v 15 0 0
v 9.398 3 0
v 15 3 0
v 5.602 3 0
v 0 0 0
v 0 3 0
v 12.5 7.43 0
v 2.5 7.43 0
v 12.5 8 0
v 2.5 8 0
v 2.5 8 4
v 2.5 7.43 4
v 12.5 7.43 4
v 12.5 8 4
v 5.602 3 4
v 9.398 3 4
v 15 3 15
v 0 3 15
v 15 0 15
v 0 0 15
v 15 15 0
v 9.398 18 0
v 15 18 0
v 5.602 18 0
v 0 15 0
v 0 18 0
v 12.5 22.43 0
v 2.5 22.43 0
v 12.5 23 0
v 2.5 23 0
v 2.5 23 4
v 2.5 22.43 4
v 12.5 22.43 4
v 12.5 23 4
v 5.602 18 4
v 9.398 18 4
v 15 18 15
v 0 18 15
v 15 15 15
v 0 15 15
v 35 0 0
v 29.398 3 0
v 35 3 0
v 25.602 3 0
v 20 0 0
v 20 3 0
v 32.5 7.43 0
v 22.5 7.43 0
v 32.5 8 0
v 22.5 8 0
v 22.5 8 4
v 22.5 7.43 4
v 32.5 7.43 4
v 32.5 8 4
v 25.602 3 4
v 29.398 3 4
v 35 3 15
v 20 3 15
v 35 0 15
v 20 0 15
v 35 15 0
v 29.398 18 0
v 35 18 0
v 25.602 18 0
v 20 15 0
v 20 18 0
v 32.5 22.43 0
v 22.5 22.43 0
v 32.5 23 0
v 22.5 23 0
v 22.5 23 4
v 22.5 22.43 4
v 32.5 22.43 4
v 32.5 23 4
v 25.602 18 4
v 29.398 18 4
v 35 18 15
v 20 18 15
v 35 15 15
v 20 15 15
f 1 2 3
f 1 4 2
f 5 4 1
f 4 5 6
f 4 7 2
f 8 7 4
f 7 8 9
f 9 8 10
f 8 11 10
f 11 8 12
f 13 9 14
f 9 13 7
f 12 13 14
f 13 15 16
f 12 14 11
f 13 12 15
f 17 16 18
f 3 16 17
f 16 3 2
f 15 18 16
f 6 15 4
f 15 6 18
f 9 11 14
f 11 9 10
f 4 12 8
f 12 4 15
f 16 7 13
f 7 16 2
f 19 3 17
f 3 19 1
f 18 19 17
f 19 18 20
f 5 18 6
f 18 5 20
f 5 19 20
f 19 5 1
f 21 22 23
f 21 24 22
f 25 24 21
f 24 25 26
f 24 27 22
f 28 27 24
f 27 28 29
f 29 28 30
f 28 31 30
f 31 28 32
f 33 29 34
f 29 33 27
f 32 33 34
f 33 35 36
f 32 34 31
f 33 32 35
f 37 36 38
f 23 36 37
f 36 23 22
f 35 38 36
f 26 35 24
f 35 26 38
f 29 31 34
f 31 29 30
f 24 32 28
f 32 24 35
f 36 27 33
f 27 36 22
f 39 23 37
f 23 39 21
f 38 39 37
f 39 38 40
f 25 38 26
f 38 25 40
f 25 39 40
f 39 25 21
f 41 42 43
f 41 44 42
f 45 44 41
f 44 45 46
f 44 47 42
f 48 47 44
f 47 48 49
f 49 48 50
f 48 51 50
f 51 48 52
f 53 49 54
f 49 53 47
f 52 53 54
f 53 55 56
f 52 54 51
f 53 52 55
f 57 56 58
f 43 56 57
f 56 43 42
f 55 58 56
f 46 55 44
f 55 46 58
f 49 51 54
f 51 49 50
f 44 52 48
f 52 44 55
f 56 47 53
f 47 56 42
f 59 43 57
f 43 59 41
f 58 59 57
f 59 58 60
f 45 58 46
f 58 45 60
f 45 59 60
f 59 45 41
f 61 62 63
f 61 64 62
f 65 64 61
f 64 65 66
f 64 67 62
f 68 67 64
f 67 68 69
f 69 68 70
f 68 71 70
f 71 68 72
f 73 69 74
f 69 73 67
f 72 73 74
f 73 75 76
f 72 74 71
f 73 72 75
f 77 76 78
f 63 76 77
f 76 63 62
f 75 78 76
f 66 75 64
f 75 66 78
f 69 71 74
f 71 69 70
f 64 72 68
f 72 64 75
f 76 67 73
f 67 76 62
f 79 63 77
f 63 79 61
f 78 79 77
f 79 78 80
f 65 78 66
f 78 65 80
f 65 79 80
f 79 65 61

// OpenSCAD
// file: shapes.scad
/*
 *  OpenSCAD Shapes Library (www.openscad.at)
 *  Copyright (C) 2009  Catarina Mota <clifford@clifford.at>
 *
 *  This program is free software; you can redistribute it and/or modify
 *  it under the terms of the GNU General Public License as published by
 *  the Free Software Foundation; either version 2 of the License, or
 *  (at your option) any later version.
 *
 *  This program is distributed in the hope that it will be useful,
 *  but WITHOUT ANY WARRANTY; without even the implied warranty of
 *  MERCHANTABILITY or FITNESS FOR A PARTICULAR PURPOSE.  See the
 *  GNU General Public License for more details.
 *
 *  You should have received a copy of the GNU General Public License
 *  along with this program; if not, write to the Free Software
 *  Foundation, Inc., 59 Temple Place, Suite 330, Boston, MA  02111-1307  USA
 *
*/


//box(width, height, depth);
//roundedBox(width, height, depth, factor);
//cone(height, radius);
//oval(width, height, depth);
//tube(height, radius, wall);
//ovalTube(width, height, depth, wall);
//hexagon(height, depth);
//octagon(height, depth);
//dodecagon(height, depth);
//hexagram(height, depth);
//rightTriangle(adjacent, opposite, depth);
//equiTriangle(side, depth);
//12ptStar(height, depth);

//----------------------

//roundedBox(120, 60, 3, 8);

//----------------------

module box(w,h,d) {
	scale ([w,h,d]) cube(1, true);
}

module roundedBox(w,h,d,f){
	difference(){
		box(w,h,d);
		translate([-w/2,h/2,0]) cube(w/(f/2),true);
		translate([w/2,h/2,0]) cube(w/(f/2),true);
		translate([-w/2,-h/2,0]) cube(w/(f/2),true);
		translate([w/2,-h/2,0]) cube(w/(f/2),true);
	}
	translate([-w/2+w/f,h/2-w/f,-d/2]) cylinder(d,w/f, w/f);
	translate([w/2-w/f,h/2-w/f,-d/2]) cylinder(d,w/f, w/f);
	translate([-w/2+w/f,-h/2+w/f,-d/2]) cylinder(d,w/f, w/f);
	translate([w/2-w/f,-h/2+w/f,-d/2]) cylinder(d,w/f, w/f);
}

module cone(height, radius) {
		cylinder(height, radius, 0);
}

module oval(w,h,d) {
	scale ([w/100, h/100, 1]) cylinder(d, 50, 50);
}

module tube(height, radius, wall) {
	difference(){
		cylinder(height, radius, radius);
		cylinder(height, radius-wall, radius-wall);
	}
}

module ovalTube(w,h,d,wall) {
	difference(){
		scale ([w/100, h/100, 1]) cylinder(d, 50, 50);
		scale ([w/100, h/100, 1]) cylinder(d, 50-wall, 50-wall);
	}
}

module hexagon(height, depth) {
	boxWidth=height/1.75;
		union(){
			box(boxWidth, height, depth);
			rotate([0,0,60]) box(boxWidth, height, depth);
			rotate([0,0,-60]) box(boxWidth, height, depth);
		}
}

module octagon(height, depth) {
	intersection(){
		box(height, height, depth);
		rotate([0,0,45]) box(height, height, depth);
	}
}

module dodecagon(height, depth) {
	intersection(){
		hexagon(height, depth);
		rotate([0,0,90]) hexagon(height, depth);
	}
}

module hexagram(height, depth) {
	boxWidth=height/1.75;
	intersection(){
		box(height, boxWidth, depth);
		rotate([0,0,60]) box(height, boxWidth, depth);
	}
	intersection(){
		box(height, boxWidth, depth);
		rotate([0,0,-60]) box(height, boxWidth, depth);
	}
	intersection(){
		rotate([0,0,60]) box(height, boxWidth, depth);
		rotate([0,0,-60]) box(height, boxWidth, depth);
	}
}

module rightTriangle(adjacent, opposite, depth) {
	difference(){
		translate([-adjacent/2,opposite/2,0]) box(adjacent, opposite, depth);
		translate([-adjacent,0,0]){
			rotate([0,0,atan(opposite/adjacent)]) dislocateBox(adjacent*2, opposite, depth);
		}
	}
}

module equiTriangle(side, depth) {
	difference(){
		translate([-side/2,side/2,0]) box(side, side, depth);
		rotate([0,0,30]) dislocateBox(side*2, side, depth);
		translate([-side,0,0]){
			rotate([0,0,60]) dislocateBox(side*2, side, depth);
		}
	}
}

module 12ptStar(height, depth) {
	starNum=3;
	starAngle=360/starNum;
	for (s=[1:starNum]){
		rotate([0, 0, s*starAngle]) box(height, height, depth);
	}
}

//-----------------------
//MOVES THE ROTATION AXIS OF A BOX FROM ITS CENTER TO THE BOTTOM LEFT CORNER
module dislocateBox(w,h,d){
	translate([w/2,h,0]){
		difference(){
			box(w, h*2, d+1);
			translate([-w,0,0]) box(w, h*2, d+1);
		}
	}
}
// main file
include <shapes.scad>  // using Catarina Mota's shapes library

//build platform
//translate ([-51,-51,-10]) cube ([102,102,5]);
piece ();
translate ([0,15,0]) piece();
translate ([20,0,0]) piece();
translate ([20,15,0]) piece();
module piece ()
{
translate ([0,0,0]) cube ([15,3,15]);
rotate ([180,90,0]) translate ([-2,-5.5,-7.5]) connector (4);
}

module connector(length) 
{
difference() 
	{
	cube(size = [length,5,10], center = true);
	translate(v= [0,1,6]) { rotate(a=[55,0,0]) 
		{
		cube(size = [length+2,5,10], center = true);
		}
	}
	translate(v= [0,1,-6]) { rotate(a=[-55,0,0]) 
		{
		cube(size = [length+2,5,10], center = true);
		}
	}
	}
}
